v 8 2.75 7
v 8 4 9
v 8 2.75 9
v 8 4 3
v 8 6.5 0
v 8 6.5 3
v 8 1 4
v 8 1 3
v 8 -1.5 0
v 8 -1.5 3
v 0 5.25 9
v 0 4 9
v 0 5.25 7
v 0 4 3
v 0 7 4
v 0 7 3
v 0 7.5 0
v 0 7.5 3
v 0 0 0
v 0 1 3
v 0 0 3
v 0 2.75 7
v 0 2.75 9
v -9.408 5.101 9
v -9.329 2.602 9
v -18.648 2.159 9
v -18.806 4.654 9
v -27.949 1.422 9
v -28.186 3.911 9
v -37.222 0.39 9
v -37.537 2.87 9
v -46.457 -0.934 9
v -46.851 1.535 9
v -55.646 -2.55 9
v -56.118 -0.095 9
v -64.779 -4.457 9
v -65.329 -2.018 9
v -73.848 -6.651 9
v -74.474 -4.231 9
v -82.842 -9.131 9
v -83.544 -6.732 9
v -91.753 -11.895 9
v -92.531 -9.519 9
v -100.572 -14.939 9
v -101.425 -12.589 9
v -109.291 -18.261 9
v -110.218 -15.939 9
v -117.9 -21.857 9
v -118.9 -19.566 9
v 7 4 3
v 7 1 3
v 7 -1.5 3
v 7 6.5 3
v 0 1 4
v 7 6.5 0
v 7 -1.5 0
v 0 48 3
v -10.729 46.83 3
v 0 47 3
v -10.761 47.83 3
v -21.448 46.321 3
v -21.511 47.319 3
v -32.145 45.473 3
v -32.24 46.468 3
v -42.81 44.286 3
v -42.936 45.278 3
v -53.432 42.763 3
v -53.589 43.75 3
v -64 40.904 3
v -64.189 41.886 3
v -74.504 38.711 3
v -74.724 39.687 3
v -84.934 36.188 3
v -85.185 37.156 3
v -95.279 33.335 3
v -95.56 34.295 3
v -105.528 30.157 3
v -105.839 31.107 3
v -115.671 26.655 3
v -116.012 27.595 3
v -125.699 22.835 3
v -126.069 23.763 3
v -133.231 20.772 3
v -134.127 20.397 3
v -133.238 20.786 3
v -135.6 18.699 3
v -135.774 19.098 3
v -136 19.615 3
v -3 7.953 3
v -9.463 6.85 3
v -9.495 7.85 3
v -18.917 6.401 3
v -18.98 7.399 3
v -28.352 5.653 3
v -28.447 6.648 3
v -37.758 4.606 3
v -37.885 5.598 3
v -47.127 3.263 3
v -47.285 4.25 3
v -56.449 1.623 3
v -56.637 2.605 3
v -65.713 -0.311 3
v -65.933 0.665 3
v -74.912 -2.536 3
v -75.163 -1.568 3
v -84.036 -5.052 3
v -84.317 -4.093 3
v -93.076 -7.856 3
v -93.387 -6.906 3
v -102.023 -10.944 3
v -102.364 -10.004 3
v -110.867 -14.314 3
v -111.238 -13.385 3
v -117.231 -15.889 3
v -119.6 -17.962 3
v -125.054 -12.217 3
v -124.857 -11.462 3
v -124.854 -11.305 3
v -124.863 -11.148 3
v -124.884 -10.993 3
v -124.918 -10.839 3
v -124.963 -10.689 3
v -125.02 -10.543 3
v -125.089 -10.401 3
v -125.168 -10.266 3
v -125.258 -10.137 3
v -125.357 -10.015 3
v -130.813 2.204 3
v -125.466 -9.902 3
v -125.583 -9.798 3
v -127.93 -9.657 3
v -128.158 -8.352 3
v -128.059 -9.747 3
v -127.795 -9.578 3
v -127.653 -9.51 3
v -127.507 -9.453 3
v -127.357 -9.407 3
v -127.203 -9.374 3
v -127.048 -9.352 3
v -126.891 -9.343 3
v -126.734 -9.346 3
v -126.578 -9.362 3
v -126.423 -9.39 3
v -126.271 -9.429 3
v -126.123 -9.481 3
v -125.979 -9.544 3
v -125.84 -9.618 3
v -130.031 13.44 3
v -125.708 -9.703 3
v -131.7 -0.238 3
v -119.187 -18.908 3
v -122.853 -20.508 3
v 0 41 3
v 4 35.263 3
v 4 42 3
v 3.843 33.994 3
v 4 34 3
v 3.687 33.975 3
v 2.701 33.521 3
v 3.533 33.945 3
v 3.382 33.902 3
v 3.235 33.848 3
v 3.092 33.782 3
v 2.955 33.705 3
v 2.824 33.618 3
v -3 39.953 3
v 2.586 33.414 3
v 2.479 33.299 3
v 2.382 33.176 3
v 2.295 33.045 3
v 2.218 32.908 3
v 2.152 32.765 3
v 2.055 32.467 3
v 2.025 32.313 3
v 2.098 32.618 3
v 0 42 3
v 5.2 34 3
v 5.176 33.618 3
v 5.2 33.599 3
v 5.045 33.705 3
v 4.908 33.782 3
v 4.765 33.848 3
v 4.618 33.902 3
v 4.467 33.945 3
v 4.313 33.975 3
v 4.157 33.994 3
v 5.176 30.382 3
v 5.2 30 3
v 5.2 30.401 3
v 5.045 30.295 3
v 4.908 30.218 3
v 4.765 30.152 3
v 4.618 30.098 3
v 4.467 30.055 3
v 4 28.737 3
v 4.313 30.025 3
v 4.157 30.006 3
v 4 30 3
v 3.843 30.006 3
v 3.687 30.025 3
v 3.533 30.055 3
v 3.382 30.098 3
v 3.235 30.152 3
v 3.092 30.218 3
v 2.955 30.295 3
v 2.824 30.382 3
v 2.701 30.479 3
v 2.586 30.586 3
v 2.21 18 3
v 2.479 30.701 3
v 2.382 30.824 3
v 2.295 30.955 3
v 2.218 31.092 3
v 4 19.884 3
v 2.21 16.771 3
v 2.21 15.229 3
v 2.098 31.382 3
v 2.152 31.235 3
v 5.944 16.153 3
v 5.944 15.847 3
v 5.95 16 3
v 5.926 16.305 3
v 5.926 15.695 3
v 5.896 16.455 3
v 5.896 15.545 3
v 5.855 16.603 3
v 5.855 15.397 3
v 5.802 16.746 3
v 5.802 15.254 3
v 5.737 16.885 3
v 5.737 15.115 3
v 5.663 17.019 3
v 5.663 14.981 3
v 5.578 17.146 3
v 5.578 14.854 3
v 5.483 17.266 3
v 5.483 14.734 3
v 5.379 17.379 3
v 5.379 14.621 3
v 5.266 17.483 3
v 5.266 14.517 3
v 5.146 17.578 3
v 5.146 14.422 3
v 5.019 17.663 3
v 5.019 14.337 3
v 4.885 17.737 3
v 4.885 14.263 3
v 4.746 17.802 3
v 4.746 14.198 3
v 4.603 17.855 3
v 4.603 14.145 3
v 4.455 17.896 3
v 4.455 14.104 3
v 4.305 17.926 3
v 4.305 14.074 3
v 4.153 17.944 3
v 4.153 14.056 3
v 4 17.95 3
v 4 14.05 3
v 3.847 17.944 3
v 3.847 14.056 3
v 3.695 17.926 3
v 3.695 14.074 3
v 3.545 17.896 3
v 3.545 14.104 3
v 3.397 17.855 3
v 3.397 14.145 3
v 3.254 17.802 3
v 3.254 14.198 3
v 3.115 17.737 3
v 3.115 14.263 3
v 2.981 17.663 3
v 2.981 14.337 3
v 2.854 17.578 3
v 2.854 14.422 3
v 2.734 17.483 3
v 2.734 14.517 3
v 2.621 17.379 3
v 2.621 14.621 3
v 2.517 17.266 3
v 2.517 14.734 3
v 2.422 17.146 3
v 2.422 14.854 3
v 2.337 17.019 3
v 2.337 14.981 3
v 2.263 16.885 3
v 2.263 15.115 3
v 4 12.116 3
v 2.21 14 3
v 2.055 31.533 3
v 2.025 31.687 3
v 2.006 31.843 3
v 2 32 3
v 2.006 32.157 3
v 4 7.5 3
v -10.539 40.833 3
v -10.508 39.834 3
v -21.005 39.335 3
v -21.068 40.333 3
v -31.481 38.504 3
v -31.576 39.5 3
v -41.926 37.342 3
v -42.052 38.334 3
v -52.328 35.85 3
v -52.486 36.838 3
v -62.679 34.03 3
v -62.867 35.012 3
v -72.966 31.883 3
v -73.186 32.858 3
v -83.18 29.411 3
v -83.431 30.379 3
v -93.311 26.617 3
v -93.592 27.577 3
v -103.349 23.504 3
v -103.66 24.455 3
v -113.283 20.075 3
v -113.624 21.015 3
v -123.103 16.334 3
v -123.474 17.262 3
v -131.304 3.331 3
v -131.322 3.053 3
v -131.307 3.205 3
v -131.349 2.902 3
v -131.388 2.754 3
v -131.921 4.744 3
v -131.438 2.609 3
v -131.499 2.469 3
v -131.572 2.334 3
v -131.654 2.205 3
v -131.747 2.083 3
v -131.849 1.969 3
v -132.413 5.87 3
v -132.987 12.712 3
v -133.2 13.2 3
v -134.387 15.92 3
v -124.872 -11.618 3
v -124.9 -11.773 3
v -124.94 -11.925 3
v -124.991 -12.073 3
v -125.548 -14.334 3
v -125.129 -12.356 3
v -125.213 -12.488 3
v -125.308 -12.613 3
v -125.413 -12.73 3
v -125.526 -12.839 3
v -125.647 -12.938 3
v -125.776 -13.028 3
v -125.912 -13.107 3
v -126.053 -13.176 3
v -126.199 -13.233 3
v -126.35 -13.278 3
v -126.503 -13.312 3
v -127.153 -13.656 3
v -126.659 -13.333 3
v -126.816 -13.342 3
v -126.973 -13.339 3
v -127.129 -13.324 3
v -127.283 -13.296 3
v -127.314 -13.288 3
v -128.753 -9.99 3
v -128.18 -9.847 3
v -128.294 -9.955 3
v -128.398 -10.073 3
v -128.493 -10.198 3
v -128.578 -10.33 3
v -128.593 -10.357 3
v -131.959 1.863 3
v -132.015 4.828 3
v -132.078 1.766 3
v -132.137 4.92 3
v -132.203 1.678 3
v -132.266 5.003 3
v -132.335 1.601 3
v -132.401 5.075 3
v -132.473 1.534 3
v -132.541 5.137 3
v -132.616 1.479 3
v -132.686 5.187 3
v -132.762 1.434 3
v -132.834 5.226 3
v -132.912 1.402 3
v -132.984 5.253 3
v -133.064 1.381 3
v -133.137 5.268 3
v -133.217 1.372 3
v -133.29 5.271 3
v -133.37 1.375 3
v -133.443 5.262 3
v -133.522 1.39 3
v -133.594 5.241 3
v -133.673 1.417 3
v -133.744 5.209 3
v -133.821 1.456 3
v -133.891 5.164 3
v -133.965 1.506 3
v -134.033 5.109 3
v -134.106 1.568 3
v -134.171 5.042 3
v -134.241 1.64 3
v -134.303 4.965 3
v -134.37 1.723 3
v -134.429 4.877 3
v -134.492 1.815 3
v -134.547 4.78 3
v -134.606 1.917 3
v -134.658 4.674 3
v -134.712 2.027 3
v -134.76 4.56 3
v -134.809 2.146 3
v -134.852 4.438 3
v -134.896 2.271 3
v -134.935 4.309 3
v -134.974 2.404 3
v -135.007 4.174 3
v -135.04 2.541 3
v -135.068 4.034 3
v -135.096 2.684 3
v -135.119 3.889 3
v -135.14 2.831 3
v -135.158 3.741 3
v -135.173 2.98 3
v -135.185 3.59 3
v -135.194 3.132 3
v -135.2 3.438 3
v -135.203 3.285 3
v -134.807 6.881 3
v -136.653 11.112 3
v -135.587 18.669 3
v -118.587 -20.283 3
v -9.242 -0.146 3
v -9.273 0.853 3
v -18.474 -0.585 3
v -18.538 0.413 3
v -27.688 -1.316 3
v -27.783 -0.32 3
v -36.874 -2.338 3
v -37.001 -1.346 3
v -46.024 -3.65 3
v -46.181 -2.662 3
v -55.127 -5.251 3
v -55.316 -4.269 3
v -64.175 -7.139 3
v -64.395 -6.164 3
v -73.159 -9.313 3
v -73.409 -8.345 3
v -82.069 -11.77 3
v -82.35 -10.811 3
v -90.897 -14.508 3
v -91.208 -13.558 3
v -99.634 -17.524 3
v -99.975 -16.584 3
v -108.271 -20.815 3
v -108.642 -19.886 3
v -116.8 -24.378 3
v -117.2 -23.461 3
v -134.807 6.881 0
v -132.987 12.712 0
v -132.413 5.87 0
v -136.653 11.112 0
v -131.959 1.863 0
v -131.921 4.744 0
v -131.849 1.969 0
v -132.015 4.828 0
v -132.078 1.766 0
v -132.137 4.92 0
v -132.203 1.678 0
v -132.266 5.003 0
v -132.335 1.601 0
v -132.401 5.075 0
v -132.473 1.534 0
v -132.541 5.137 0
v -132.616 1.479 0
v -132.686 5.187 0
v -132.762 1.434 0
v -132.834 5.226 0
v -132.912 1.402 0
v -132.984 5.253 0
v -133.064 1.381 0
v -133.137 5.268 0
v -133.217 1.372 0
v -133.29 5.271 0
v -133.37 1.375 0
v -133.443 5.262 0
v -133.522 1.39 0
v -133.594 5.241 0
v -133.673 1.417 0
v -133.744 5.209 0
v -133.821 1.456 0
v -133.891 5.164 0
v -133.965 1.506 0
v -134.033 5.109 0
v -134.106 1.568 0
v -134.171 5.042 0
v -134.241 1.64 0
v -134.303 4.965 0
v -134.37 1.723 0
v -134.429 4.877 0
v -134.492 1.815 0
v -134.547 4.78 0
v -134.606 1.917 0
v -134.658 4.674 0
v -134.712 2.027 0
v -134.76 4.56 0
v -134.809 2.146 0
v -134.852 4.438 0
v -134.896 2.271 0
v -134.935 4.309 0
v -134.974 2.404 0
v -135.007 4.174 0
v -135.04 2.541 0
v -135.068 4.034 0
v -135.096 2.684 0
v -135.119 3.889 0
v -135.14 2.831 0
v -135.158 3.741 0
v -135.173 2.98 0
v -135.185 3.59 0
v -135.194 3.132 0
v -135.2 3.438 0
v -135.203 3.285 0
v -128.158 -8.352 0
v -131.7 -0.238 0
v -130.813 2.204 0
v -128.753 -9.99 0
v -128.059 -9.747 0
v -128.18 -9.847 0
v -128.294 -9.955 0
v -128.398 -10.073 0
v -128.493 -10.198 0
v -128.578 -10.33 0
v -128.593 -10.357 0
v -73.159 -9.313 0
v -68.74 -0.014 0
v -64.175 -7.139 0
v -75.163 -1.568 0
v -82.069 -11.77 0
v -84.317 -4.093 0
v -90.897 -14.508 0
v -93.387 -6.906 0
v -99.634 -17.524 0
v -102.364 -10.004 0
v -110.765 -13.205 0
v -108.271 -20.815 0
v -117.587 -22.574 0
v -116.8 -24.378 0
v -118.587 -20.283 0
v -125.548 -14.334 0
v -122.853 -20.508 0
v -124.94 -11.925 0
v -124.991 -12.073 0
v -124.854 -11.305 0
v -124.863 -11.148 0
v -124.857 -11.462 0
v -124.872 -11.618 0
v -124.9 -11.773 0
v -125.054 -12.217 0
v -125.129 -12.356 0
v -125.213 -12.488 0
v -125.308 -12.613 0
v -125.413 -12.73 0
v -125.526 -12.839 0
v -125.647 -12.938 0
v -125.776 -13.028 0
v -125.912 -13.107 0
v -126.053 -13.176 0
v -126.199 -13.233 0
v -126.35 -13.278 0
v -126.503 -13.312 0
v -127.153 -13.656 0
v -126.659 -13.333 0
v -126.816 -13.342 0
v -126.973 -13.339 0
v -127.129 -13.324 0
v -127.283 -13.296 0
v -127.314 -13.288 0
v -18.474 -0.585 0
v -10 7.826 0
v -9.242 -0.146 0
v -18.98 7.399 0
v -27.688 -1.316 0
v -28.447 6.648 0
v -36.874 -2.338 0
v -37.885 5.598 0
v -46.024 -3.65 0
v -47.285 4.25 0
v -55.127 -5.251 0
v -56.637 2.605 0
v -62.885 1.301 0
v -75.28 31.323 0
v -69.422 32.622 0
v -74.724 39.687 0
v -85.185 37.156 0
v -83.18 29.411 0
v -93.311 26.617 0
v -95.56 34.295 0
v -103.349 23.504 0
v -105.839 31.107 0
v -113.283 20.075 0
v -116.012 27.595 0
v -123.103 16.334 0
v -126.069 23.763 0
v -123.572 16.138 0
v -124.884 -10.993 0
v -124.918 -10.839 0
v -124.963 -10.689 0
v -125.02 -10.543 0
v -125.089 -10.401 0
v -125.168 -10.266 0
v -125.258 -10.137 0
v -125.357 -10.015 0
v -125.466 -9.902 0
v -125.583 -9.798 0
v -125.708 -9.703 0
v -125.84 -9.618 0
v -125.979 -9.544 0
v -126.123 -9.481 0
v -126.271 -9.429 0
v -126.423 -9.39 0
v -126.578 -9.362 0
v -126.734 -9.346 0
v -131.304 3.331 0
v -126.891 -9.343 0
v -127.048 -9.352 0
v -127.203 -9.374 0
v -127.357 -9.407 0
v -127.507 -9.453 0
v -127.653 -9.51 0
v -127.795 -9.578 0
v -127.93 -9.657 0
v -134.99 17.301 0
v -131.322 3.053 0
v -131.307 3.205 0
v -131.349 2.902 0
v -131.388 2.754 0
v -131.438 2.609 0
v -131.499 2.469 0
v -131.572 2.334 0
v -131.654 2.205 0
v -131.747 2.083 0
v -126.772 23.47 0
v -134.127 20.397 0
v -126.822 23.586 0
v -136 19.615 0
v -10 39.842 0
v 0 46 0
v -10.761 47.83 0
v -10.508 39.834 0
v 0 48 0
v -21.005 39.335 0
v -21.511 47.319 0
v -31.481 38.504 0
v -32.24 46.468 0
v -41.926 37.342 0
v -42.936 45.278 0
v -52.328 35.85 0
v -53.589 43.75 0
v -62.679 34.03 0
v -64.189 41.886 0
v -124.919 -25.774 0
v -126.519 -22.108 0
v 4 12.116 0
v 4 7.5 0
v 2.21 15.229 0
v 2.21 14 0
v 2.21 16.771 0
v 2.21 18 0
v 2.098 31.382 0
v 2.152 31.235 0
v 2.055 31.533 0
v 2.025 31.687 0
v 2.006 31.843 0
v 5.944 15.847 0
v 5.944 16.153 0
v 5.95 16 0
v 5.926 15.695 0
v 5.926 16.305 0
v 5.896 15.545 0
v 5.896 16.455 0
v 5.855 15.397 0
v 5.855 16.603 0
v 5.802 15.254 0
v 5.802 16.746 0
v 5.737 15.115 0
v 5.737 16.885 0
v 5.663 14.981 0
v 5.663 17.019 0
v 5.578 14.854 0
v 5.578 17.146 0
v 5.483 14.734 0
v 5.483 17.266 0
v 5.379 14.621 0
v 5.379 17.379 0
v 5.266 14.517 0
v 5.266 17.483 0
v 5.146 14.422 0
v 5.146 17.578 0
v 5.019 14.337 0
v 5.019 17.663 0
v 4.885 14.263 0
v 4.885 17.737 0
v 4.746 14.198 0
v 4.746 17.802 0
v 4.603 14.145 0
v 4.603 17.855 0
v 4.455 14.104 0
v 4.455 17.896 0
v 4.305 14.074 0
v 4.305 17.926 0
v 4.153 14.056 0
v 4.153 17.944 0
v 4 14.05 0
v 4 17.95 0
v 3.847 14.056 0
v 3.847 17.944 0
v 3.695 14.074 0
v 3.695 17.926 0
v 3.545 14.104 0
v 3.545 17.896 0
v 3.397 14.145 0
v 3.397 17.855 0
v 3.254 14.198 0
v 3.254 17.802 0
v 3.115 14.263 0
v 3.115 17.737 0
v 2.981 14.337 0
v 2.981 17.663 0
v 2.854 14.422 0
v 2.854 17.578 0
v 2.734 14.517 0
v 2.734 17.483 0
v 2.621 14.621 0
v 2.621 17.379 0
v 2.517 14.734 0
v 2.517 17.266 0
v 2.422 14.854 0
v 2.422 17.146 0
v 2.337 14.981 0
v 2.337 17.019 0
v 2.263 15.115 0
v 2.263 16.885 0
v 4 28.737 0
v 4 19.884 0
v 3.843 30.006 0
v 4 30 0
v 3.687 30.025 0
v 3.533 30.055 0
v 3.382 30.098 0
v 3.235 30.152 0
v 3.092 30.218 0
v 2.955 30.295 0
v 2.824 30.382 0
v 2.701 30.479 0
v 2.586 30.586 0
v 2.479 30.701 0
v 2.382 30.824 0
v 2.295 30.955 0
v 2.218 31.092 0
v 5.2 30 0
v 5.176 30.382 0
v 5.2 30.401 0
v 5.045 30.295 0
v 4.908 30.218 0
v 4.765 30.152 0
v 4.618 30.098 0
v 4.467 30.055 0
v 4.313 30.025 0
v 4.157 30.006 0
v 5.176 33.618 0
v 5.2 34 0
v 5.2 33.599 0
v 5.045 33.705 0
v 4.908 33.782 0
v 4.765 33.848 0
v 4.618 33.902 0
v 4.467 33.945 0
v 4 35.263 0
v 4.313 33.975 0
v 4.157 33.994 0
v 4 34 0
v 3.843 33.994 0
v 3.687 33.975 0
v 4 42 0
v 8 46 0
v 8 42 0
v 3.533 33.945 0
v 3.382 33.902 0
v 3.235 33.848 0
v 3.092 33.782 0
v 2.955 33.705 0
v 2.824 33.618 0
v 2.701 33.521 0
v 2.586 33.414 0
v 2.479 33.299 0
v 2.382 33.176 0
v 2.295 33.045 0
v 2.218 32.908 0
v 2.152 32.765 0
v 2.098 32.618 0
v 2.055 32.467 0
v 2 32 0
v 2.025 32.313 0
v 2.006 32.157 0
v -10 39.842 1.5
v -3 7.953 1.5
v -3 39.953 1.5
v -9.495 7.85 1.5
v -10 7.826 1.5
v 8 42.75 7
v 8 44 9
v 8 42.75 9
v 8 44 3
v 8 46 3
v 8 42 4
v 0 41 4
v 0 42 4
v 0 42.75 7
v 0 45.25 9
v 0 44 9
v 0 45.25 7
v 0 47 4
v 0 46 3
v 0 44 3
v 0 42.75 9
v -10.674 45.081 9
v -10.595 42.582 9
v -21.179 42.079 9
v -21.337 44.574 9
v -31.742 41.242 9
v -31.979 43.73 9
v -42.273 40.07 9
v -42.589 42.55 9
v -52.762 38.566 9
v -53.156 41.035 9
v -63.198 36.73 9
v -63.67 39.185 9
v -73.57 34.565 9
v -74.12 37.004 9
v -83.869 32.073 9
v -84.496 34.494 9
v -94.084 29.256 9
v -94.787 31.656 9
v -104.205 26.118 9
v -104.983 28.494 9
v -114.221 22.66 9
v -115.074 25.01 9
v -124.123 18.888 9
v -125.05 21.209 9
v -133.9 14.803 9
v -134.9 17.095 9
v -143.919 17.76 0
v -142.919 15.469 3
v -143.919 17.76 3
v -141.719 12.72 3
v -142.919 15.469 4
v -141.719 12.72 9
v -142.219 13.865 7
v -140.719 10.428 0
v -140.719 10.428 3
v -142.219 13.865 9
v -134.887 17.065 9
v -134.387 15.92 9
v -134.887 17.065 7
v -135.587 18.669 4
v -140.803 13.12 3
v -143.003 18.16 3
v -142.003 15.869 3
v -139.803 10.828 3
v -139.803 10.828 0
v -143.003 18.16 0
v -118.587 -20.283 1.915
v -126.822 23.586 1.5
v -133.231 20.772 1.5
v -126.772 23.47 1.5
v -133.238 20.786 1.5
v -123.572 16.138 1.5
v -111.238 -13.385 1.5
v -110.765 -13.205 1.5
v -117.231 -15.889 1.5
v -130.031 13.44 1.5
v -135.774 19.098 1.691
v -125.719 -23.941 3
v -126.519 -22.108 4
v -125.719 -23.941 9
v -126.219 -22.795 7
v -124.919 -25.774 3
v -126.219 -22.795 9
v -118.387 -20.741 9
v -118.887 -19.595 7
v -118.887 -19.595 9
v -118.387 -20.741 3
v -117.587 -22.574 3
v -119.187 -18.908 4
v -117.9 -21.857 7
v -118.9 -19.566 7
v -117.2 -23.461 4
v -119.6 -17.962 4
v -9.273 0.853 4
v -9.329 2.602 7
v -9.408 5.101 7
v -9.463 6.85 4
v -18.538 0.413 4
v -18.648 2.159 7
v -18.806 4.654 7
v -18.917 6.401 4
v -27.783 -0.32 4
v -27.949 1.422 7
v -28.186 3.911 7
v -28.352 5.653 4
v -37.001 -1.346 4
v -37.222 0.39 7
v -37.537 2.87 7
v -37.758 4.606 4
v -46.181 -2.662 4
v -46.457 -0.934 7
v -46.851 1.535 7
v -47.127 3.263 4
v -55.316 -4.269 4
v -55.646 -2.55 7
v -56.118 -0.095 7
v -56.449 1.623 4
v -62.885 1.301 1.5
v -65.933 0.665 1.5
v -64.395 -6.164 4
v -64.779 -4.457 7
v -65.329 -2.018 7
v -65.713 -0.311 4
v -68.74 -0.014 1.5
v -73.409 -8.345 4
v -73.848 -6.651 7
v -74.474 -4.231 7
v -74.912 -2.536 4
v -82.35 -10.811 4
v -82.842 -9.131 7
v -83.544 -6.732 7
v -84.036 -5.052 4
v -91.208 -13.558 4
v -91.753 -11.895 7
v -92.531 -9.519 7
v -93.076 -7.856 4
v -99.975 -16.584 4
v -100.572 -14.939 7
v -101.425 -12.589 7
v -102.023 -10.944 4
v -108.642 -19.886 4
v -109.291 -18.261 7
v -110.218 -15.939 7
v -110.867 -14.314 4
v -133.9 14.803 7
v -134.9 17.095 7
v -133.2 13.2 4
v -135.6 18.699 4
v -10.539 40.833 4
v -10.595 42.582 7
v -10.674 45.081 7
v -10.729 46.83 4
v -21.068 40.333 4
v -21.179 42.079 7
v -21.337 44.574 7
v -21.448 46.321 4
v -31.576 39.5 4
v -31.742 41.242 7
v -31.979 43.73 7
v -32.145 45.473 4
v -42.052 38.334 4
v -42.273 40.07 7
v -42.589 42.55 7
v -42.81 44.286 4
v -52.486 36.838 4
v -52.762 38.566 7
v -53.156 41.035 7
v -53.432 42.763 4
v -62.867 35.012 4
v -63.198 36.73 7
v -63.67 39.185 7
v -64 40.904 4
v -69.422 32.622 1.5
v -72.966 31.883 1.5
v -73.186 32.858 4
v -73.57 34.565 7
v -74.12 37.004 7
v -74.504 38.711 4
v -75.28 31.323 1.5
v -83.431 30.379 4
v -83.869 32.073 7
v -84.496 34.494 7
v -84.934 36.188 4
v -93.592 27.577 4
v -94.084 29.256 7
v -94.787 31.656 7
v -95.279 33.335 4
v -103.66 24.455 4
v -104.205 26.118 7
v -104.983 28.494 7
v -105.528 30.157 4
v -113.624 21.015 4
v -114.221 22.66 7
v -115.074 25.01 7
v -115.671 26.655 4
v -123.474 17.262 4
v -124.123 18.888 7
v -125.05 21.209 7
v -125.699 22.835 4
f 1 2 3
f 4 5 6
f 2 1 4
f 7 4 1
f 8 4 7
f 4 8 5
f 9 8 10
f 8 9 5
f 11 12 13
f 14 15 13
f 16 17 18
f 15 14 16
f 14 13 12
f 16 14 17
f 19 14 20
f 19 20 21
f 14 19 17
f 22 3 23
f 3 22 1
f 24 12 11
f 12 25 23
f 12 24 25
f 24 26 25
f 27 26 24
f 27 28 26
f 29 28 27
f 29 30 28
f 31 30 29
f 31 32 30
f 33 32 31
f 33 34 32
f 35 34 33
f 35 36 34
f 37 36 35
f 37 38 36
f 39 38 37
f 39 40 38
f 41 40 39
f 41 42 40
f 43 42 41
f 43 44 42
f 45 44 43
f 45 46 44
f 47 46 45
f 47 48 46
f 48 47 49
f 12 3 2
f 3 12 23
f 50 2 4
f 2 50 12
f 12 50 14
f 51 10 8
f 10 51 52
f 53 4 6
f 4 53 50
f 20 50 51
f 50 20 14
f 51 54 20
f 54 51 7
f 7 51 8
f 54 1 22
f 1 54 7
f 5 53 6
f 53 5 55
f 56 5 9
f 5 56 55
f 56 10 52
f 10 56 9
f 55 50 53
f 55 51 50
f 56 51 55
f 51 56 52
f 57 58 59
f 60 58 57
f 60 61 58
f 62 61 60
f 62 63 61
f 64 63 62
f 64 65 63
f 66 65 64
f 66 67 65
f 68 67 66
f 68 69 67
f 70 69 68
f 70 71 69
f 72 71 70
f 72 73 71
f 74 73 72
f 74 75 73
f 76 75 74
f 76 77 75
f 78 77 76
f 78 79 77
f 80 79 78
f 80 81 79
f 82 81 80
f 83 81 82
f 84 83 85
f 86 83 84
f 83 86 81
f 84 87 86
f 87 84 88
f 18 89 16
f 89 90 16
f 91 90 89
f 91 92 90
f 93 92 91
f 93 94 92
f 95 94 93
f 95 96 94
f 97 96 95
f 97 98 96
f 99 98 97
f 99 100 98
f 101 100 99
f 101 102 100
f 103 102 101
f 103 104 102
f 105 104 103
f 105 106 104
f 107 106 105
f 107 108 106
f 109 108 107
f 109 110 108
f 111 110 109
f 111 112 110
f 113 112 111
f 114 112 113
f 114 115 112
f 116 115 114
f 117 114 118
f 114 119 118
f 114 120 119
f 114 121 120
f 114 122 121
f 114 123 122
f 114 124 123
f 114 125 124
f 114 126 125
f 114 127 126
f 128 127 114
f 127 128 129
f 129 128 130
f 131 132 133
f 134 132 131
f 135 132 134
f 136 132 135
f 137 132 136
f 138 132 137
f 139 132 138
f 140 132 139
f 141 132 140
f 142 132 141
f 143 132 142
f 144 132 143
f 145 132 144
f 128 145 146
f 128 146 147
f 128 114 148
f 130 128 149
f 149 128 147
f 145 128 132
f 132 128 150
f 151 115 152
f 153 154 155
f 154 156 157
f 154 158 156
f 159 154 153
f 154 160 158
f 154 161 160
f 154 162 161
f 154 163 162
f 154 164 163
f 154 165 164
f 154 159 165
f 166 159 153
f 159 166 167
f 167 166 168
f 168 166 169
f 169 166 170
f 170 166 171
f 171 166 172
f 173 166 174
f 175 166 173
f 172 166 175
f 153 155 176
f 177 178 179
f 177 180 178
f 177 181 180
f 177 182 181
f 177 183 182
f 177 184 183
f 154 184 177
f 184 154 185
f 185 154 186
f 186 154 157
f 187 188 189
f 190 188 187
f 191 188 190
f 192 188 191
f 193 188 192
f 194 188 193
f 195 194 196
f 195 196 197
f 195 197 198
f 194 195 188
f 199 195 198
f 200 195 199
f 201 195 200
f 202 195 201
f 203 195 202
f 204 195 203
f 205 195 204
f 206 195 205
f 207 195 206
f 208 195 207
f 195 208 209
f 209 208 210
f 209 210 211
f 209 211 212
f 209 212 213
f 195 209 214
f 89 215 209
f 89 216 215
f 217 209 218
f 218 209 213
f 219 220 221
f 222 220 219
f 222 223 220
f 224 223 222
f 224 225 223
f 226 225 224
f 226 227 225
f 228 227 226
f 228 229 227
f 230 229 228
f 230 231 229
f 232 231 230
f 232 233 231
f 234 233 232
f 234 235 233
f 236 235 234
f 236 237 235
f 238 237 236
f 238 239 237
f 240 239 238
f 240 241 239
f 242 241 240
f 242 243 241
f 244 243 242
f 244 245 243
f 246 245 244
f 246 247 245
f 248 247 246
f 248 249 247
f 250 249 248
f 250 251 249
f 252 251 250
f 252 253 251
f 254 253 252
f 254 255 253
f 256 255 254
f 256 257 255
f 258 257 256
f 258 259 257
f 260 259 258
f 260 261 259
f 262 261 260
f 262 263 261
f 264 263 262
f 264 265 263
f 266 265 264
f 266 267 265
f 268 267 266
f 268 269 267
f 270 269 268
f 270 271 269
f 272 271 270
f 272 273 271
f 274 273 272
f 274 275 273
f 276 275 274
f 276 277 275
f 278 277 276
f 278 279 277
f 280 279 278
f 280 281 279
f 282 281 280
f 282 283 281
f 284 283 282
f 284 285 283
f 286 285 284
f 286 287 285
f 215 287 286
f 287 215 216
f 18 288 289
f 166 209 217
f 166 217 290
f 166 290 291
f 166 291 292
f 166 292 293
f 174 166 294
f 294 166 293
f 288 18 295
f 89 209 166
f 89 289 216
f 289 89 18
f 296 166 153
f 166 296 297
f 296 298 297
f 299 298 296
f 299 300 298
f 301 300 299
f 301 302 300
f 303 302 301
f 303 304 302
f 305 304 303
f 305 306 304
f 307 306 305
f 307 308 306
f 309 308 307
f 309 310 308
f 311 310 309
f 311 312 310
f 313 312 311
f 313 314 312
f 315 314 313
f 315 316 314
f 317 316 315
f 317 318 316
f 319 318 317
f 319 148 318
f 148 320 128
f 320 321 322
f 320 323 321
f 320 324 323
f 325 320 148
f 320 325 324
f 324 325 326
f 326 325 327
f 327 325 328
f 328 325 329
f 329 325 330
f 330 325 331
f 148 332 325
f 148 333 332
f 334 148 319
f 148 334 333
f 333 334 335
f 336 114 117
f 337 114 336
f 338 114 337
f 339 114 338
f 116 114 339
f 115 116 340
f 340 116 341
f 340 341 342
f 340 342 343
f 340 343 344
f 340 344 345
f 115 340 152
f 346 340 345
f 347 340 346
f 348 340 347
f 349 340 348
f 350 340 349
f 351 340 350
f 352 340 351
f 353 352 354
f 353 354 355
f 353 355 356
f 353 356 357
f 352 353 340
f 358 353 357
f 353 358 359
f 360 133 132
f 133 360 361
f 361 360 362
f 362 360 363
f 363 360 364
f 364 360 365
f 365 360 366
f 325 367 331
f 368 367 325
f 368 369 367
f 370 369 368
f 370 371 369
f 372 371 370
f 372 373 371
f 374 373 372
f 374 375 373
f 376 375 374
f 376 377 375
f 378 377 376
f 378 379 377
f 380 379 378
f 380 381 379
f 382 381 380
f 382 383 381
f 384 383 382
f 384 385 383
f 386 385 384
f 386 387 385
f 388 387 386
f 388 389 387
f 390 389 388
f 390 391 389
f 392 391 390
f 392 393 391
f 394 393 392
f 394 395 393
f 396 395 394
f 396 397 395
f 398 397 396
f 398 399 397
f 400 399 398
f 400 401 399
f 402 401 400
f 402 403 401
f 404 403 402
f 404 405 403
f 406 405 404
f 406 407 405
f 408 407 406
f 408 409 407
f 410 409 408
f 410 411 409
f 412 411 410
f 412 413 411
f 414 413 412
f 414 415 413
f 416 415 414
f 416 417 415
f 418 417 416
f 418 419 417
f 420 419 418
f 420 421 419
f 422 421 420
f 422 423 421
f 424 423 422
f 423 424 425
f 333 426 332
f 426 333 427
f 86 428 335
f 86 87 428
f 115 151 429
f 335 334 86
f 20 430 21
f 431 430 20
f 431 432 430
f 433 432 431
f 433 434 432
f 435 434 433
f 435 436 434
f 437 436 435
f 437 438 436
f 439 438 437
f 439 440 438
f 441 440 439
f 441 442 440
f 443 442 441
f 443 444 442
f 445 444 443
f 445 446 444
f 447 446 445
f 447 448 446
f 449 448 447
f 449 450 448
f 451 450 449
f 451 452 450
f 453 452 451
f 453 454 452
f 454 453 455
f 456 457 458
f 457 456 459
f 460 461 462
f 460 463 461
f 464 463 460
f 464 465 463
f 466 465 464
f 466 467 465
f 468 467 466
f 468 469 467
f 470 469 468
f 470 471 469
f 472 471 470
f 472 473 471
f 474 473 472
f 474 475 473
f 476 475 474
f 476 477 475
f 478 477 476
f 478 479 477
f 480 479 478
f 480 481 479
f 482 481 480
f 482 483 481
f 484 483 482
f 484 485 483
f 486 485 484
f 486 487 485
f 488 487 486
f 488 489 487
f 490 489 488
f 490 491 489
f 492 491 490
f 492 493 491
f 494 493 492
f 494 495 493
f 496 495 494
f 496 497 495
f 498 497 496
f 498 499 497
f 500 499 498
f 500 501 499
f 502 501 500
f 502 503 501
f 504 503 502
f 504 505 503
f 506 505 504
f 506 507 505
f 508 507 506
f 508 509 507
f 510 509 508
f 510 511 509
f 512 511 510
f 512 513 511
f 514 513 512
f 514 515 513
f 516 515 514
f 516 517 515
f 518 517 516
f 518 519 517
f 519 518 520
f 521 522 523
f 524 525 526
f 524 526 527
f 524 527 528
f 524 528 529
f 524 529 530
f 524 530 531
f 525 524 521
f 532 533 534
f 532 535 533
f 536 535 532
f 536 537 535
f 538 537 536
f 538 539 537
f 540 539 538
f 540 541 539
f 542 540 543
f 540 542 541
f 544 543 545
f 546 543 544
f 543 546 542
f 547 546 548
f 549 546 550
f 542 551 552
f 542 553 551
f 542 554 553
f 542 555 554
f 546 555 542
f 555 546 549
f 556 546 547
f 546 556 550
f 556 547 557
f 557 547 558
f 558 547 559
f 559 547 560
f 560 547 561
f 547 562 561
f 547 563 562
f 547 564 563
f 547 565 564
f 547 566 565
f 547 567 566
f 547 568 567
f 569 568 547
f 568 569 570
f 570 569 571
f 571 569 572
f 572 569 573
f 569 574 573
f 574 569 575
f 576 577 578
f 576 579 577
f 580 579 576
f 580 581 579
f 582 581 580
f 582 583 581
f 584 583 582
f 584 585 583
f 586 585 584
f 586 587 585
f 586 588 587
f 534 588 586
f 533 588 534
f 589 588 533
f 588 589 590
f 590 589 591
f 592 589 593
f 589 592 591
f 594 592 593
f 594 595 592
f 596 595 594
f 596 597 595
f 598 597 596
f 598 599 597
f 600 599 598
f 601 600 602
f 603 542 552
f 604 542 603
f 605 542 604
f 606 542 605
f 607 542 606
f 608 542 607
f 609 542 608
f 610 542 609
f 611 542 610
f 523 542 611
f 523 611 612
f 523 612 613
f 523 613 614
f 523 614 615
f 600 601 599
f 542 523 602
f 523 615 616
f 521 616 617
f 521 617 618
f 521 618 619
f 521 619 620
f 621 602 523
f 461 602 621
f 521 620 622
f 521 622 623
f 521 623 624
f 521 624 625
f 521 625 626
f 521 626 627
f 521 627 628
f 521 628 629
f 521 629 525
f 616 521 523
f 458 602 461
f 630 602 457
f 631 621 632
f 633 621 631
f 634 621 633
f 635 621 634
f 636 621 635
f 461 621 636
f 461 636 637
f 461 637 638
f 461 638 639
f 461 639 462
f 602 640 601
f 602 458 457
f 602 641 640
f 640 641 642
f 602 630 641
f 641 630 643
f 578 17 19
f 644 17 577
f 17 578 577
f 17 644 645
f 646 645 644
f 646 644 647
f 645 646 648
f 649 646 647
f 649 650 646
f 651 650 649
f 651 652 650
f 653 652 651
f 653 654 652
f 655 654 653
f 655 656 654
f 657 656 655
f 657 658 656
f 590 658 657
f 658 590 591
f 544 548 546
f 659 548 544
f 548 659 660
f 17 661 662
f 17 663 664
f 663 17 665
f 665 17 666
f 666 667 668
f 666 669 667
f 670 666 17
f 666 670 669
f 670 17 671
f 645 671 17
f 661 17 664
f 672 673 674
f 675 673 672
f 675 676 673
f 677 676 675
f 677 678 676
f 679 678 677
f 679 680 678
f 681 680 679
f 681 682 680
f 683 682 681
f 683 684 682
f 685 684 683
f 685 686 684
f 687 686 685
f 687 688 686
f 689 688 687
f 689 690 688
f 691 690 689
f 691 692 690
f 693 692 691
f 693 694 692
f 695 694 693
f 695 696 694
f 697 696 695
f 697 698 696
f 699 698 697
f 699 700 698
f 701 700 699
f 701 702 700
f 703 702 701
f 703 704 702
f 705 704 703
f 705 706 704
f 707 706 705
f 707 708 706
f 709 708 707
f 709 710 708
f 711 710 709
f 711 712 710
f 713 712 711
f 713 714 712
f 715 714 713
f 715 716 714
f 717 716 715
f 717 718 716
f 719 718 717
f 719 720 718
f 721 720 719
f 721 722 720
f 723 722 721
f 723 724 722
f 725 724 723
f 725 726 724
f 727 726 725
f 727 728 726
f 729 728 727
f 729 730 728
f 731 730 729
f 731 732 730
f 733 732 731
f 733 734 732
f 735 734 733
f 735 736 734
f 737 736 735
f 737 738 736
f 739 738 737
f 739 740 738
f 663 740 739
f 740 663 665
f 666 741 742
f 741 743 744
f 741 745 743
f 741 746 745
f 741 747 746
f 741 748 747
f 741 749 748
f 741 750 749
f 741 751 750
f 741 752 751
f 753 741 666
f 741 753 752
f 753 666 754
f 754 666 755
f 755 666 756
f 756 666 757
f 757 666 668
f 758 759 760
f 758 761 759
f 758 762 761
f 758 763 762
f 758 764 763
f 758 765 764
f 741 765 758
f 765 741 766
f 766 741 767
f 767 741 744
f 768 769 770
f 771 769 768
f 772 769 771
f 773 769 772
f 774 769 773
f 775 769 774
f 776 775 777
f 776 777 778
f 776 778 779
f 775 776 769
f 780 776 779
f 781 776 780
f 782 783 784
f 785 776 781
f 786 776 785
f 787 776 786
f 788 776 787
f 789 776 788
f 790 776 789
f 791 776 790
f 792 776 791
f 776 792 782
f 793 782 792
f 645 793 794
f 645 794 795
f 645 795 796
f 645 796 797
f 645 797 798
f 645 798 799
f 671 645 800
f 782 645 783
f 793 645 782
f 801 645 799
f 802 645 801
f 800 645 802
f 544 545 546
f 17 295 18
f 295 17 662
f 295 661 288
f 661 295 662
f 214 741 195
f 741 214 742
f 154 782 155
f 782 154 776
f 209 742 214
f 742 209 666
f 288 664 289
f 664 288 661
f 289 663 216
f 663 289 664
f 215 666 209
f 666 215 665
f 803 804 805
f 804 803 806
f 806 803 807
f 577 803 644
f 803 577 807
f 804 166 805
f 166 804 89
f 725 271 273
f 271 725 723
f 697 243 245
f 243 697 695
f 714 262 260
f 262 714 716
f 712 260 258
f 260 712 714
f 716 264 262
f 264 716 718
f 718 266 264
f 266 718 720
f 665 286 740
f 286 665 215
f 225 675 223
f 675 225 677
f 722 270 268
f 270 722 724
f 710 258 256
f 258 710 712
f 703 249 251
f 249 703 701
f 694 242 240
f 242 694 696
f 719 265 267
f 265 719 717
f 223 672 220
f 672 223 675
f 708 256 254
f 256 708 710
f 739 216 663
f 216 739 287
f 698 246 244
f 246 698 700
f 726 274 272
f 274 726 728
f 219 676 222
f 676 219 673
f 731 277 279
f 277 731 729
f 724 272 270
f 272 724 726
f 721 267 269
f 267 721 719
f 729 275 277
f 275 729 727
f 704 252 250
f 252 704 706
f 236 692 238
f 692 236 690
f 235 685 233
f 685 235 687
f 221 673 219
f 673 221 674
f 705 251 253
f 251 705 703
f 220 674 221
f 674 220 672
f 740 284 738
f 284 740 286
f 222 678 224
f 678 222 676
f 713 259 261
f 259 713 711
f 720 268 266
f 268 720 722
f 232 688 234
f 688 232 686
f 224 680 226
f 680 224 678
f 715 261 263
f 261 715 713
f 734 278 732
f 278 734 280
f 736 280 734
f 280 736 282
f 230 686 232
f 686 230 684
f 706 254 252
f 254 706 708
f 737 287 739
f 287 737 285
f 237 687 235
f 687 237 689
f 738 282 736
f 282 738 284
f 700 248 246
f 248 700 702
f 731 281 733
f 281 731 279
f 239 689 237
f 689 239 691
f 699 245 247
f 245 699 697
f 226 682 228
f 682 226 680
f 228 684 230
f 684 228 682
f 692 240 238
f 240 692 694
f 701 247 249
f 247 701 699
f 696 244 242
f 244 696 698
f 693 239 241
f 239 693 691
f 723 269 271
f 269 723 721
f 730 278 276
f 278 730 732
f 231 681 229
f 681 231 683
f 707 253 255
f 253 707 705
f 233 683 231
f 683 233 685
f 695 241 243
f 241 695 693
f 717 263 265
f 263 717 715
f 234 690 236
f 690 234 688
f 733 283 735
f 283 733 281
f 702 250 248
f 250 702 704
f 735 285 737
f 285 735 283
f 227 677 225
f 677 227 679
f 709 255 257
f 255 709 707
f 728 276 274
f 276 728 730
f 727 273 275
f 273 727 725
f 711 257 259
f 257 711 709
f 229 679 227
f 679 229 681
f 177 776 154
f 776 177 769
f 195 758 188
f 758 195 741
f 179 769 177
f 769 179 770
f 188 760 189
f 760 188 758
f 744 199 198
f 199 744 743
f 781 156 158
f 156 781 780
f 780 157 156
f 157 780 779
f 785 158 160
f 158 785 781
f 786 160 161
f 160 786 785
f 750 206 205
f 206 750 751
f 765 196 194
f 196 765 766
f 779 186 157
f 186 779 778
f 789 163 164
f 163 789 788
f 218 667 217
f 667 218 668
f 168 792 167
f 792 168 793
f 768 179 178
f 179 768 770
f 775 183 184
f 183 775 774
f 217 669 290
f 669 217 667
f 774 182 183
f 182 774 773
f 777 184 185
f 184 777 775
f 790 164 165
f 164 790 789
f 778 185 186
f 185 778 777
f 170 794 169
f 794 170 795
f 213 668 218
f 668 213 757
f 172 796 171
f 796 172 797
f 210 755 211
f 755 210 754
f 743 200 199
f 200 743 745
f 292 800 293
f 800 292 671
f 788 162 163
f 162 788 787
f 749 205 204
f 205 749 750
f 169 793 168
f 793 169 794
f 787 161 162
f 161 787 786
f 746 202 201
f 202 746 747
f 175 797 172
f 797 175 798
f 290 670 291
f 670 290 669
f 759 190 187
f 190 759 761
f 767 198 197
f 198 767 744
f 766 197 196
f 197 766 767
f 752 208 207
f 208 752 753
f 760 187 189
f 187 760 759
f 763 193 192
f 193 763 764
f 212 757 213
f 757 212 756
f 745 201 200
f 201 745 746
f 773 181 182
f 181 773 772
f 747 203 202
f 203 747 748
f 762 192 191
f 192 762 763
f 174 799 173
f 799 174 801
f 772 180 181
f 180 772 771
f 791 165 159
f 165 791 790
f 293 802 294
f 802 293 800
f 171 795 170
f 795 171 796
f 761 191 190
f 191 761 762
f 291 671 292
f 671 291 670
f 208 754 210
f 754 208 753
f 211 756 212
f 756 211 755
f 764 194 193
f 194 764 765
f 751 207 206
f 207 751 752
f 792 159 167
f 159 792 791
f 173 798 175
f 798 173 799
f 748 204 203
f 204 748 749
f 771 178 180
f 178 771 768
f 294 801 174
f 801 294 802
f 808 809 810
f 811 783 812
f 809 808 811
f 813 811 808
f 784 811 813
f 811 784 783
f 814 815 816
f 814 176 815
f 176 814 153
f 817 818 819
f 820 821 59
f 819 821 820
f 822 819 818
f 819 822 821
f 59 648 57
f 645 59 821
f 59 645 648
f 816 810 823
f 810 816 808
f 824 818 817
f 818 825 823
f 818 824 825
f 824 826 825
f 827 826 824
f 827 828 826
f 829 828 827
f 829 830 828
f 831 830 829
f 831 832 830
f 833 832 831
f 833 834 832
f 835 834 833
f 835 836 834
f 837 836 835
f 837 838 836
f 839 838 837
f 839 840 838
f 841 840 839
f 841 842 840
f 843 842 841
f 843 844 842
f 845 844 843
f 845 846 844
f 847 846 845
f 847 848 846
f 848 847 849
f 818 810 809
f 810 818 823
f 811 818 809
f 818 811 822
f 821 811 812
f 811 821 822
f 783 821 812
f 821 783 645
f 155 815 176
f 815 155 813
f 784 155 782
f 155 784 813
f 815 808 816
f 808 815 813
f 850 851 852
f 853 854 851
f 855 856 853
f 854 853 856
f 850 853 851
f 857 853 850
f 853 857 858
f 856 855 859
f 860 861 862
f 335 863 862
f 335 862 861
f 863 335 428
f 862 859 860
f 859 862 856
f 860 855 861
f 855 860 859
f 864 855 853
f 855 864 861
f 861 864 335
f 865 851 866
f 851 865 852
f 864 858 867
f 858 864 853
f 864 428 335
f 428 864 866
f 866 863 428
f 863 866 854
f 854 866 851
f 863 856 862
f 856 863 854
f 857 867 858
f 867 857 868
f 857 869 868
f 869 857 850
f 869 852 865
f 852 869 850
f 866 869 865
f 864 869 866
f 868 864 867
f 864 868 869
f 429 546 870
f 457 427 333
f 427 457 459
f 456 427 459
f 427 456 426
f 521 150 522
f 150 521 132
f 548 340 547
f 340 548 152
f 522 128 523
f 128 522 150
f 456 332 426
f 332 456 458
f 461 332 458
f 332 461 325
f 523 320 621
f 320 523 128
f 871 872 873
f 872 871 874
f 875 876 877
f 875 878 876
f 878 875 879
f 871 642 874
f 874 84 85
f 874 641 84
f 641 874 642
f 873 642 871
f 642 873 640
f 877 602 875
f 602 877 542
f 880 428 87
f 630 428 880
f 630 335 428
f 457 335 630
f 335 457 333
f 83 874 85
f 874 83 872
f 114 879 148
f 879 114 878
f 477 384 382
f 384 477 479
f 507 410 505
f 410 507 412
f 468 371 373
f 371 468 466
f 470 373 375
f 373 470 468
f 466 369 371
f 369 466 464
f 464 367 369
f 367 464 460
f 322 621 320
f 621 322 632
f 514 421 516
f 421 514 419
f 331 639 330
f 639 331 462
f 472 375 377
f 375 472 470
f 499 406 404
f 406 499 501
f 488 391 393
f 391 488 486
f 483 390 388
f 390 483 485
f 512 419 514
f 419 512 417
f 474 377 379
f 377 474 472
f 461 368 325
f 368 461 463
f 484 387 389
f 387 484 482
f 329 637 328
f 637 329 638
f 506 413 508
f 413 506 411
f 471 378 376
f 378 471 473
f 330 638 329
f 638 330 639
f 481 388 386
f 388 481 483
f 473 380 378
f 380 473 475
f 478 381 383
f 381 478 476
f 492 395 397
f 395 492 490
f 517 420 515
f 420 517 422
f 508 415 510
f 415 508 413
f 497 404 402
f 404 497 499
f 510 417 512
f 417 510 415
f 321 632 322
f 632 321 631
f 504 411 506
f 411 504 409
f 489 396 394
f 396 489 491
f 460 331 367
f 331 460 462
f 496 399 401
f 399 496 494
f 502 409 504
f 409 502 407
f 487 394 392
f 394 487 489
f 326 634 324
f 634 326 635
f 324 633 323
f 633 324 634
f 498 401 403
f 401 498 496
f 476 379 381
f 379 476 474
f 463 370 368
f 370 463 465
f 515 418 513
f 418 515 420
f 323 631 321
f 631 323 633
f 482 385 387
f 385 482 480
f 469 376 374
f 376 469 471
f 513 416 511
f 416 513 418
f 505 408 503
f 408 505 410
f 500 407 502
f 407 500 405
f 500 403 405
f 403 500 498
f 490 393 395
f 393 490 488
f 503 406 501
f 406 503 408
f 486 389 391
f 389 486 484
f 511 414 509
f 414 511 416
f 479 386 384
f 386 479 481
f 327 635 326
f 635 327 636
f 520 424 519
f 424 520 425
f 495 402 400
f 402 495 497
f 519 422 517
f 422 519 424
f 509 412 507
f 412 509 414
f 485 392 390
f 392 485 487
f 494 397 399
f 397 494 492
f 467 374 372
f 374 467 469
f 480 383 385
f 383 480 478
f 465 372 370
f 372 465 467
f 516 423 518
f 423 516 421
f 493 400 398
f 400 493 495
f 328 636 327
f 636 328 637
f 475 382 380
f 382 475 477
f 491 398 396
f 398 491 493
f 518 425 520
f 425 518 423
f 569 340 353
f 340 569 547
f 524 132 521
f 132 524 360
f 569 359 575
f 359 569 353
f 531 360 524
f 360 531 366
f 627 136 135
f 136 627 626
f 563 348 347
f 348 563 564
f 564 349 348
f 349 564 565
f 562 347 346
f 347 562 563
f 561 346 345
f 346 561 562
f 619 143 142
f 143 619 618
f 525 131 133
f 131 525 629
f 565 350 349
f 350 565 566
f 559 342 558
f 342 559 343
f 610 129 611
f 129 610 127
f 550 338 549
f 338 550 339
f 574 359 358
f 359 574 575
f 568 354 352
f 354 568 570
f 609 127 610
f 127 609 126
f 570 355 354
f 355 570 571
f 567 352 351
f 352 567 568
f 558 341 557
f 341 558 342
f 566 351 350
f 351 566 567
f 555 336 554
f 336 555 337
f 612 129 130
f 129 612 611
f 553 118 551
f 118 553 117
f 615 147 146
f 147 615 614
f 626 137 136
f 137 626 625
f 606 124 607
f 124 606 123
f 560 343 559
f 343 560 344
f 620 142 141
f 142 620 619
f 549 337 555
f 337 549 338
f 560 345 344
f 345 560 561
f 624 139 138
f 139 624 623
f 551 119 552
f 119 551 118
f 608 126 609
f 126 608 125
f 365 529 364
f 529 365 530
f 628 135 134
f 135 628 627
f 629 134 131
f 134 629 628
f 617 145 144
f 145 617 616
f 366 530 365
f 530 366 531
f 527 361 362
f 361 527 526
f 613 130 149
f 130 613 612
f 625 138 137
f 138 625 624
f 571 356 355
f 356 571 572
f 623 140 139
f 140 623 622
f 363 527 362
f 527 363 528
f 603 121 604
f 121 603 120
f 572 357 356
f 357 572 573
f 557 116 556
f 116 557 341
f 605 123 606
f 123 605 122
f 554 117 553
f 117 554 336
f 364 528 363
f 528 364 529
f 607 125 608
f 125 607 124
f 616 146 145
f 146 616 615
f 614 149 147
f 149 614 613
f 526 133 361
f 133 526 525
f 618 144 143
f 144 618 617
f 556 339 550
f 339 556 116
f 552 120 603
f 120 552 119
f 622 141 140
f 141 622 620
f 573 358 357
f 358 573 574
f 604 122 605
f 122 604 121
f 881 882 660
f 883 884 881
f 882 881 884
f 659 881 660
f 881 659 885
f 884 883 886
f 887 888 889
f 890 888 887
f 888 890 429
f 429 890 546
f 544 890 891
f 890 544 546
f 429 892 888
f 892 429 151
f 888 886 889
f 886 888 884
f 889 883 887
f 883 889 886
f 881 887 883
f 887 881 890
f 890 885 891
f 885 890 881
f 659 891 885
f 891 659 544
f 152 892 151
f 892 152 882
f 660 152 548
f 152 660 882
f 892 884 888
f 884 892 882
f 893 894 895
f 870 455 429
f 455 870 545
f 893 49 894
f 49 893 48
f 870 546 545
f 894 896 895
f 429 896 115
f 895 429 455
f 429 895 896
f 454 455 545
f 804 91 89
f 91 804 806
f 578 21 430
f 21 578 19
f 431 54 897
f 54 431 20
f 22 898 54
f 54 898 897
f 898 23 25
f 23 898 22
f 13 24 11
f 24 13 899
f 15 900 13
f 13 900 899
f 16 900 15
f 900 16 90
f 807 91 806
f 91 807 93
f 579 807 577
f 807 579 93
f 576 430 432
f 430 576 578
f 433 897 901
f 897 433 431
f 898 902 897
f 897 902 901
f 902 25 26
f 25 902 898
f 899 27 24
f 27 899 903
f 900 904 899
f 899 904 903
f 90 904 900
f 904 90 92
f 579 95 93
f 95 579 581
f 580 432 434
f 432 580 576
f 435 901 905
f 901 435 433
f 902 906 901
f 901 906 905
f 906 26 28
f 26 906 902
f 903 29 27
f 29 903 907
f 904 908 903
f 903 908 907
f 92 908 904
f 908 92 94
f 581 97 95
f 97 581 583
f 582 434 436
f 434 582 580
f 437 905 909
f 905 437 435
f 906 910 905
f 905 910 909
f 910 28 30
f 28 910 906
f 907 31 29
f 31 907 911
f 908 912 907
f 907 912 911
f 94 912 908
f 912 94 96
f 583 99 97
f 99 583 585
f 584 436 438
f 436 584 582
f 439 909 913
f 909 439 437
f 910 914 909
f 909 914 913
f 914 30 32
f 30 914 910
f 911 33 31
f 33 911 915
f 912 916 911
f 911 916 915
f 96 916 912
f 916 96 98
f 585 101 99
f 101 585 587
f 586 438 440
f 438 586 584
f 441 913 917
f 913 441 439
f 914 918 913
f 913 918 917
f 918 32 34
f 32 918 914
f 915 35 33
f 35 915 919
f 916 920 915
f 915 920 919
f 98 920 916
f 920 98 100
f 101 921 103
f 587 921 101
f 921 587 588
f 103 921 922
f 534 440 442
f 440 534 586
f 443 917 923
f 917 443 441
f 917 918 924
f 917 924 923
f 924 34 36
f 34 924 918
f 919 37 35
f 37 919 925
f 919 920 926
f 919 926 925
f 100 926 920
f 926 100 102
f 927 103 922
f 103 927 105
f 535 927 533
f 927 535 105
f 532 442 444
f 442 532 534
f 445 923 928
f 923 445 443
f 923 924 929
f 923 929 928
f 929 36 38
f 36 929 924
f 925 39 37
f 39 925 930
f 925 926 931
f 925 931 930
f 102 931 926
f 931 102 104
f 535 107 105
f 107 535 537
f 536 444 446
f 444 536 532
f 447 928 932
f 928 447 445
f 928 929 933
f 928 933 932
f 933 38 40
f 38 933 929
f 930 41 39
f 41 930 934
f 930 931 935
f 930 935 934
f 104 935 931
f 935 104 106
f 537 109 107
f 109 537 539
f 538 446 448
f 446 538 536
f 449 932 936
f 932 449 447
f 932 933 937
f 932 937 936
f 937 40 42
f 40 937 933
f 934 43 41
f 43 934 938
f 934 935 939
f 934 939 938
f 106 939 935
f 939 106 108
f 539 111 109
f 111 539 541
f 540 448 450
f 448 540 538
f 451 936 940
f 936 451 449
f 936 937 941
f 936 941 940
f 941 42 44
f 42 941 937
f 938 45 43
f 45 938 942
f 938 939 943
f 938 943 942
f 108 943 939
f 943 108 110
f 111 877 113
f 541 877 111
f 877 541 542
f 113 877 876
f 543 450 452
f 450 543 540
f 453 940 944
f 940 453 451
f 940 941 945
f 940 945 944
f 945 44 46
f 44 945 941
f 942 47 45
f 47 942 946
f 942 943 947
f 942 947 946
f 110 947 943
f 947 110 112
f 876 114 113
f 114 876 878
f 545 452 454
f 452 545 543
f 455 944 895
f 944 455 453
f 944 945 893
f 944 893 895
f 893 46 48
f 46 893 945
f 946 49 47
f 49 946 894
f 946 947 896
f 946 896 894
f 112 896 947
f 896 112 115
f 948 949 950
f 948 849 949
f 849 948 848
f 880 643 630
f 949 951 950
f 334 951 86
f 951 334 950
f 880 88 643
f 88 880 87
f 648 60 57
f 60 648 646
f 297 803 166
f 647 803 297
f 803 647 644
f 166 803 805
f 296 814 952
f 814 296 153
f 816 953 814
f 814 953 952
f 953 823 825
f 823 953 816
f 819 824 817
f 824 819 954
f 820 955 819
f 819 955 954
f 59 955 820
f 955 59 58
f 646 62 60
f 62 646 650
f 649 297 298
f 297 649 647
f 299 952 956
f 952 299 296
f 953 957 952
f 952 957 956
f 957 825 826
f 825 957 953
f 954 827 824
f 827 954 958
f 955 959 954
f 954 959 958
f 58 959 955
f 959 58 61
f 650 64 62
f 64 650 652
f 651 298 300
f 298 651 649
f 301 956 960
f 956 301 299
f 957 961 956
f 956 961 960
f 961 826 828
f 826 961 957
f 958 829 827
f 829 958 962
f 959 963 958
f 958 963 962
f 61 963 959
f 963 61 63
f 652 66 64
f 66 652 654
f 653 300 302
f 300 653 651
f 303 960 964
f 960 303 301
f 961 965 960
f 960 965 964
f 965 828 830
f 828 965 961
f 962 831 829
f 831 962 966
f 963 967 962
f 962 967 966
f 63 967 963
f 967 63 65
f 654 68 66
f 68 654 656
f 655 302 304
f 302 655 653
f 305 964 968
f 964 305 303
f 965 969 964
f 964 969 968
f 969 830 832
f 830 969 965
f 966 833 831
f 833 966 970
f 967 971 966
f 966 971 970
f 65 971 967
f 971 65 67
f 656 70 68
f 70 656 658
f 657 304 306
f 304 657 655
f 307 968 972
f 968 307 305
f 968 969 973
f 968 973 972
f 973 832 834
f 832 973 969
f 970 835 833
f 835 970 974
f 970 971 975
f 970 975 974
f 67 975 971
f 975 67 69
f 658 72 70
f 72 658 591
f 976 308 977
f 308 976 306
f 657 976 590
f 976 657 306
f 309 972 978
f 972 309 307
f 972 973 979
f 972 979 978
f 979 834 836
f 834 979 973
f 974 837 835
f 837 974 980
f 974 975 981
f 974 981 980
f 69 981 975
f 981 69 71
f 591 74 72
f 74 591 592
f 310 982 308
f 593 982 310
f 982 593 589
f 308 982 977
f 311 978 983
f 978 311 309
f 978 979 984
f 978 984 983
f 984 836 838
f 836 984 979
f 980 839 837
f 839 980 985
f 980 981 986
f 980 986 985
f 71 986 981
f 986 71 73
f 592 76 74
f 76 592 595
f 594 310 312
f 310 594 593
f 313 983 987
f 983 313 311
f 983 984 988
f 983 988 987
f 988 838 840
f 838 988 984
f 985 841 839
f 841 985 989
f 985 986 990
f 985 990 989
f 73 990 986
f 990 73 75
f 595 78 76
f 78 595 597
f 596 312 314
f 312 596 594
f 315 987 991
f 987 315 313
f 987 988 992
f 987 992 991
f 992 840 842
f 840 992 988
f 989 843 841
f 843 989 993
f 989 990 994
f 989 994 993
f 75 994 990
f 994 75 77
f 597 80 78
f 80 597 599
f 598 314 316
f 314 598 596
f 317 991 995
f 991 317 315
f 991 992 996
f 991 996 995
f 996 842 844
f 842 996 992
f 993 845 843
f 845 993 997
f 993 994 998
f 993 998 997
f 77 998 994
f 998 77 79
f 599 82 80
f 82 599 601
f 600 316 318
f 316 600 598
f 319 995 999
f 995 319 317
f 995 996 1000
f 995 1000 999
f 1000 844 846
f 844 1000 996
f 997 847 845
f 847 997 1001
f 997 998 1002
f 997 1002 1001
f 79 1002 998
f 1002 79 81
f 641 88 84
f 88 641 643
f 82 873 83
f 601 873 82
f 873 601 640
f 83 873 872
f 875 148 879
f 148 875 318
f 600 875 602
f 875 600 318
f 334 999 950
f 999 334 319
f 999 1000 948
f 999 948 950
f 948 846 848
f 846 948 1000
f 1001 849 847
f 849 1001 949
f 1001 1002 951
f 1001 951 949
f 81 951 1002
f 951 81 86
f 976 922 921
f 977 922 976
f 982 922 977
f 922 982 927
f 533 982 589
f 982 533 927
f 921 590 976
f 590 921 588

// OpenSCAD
length = 120;
diameter = 300;

module rail_main(length) {
    poly = [[0,0],[0,8],[3,8],[3,7],[4,7],[7,5.25],[9,5.25],[9,2.75],[7,2.75],[4,1],[3,1],[3,0]];
    rotate([90,-90,180]) linear_extrude(length) polygon(poly);
}

module rail_curved(angle, diameter) {
    poly = [[0,0],[0,8],[3,8],[3,7],[4,7],[7,5.25],[9,5.25],[9,2.75],[7,2.75],[4,1],[3,1],[3,0]];
    translate([-diameter+8,0,0])
    rotate_extrude(angle = angle, $fn = 200)
    translate([diameter,0,0])
    rotate([0,0,90]) 
    polygon(poly);
}

module rail_endpoint_right() {
    poly = [[0,2],[0,6],[3,6],[3,4],[9,4],[9,2.75],[7,2.75],[4,2],[3,2]];
    rotate([90,-90,180]) linear_extrude(8) polygon(poly);
}

module rail_endpoint_left() {
    poly = [[3,8],[3,4],[9,4],[9,2.75],[7,2.75],[4,1],[3,1]];
    rotate([90,-90,180]) linear_extrude(8) polygon(poly);
    // support
    translate([-1.5,0,0]) cube([8,1,3], false);
}

module attach_poly(h) {
    linear_extrude(h) polygon([[0,0],[2,1.9],[6,1.9],[8,0]]);
}

module attach(l) {
    difference() {
        union() {
            cube([41,l,1.5], false);
            cube([41,3,3], false);
            difference() {
                translate ([7.5,-4,0]) cube([36,6,3], false);
                translate ([12,-4.11,-0.5]) attach_poly(4);
            }
            translate ([16,-4,0]) cylinder(3,1.95,1.95,false, $fn = 80);
            translate ([28,-3.3,0]) mirror([0,1,0]) attach_poly(3);
        }
        translate ([32,-4,-0.5]) cylinder(4,2,2,false, $fn = 80);
    }
}

module full_endpoint() {
    translate([0,-8,0]) rail_endpoint_left();
    translate([40,-8,0]) rail_endpoint_right();
    attach(10);
}

module barreau() {
    translate([8,0,0]) cube([36,6,1.5], false);
}

module main() {

    angle = asin(length/diameter);
    rail_curved(angle, diameter);
    translate([40,0,0]) rail_curved(angle, diameter+40);
    
    full_endpoint();

    translate([-diameter,0,0]) 
    rotate([0,0,angle]) 
    translate([diameter+47.3,-3.2,0]) rotate([180,180,0]) full_endpoint();

    translate([-diameter,0,0]) 
    rotate([0,0,angle/2]) 
    translate([diameter-2,0,0]) barreau();
}

rotate([0,0,90]) main();


//rail_curved(length);
